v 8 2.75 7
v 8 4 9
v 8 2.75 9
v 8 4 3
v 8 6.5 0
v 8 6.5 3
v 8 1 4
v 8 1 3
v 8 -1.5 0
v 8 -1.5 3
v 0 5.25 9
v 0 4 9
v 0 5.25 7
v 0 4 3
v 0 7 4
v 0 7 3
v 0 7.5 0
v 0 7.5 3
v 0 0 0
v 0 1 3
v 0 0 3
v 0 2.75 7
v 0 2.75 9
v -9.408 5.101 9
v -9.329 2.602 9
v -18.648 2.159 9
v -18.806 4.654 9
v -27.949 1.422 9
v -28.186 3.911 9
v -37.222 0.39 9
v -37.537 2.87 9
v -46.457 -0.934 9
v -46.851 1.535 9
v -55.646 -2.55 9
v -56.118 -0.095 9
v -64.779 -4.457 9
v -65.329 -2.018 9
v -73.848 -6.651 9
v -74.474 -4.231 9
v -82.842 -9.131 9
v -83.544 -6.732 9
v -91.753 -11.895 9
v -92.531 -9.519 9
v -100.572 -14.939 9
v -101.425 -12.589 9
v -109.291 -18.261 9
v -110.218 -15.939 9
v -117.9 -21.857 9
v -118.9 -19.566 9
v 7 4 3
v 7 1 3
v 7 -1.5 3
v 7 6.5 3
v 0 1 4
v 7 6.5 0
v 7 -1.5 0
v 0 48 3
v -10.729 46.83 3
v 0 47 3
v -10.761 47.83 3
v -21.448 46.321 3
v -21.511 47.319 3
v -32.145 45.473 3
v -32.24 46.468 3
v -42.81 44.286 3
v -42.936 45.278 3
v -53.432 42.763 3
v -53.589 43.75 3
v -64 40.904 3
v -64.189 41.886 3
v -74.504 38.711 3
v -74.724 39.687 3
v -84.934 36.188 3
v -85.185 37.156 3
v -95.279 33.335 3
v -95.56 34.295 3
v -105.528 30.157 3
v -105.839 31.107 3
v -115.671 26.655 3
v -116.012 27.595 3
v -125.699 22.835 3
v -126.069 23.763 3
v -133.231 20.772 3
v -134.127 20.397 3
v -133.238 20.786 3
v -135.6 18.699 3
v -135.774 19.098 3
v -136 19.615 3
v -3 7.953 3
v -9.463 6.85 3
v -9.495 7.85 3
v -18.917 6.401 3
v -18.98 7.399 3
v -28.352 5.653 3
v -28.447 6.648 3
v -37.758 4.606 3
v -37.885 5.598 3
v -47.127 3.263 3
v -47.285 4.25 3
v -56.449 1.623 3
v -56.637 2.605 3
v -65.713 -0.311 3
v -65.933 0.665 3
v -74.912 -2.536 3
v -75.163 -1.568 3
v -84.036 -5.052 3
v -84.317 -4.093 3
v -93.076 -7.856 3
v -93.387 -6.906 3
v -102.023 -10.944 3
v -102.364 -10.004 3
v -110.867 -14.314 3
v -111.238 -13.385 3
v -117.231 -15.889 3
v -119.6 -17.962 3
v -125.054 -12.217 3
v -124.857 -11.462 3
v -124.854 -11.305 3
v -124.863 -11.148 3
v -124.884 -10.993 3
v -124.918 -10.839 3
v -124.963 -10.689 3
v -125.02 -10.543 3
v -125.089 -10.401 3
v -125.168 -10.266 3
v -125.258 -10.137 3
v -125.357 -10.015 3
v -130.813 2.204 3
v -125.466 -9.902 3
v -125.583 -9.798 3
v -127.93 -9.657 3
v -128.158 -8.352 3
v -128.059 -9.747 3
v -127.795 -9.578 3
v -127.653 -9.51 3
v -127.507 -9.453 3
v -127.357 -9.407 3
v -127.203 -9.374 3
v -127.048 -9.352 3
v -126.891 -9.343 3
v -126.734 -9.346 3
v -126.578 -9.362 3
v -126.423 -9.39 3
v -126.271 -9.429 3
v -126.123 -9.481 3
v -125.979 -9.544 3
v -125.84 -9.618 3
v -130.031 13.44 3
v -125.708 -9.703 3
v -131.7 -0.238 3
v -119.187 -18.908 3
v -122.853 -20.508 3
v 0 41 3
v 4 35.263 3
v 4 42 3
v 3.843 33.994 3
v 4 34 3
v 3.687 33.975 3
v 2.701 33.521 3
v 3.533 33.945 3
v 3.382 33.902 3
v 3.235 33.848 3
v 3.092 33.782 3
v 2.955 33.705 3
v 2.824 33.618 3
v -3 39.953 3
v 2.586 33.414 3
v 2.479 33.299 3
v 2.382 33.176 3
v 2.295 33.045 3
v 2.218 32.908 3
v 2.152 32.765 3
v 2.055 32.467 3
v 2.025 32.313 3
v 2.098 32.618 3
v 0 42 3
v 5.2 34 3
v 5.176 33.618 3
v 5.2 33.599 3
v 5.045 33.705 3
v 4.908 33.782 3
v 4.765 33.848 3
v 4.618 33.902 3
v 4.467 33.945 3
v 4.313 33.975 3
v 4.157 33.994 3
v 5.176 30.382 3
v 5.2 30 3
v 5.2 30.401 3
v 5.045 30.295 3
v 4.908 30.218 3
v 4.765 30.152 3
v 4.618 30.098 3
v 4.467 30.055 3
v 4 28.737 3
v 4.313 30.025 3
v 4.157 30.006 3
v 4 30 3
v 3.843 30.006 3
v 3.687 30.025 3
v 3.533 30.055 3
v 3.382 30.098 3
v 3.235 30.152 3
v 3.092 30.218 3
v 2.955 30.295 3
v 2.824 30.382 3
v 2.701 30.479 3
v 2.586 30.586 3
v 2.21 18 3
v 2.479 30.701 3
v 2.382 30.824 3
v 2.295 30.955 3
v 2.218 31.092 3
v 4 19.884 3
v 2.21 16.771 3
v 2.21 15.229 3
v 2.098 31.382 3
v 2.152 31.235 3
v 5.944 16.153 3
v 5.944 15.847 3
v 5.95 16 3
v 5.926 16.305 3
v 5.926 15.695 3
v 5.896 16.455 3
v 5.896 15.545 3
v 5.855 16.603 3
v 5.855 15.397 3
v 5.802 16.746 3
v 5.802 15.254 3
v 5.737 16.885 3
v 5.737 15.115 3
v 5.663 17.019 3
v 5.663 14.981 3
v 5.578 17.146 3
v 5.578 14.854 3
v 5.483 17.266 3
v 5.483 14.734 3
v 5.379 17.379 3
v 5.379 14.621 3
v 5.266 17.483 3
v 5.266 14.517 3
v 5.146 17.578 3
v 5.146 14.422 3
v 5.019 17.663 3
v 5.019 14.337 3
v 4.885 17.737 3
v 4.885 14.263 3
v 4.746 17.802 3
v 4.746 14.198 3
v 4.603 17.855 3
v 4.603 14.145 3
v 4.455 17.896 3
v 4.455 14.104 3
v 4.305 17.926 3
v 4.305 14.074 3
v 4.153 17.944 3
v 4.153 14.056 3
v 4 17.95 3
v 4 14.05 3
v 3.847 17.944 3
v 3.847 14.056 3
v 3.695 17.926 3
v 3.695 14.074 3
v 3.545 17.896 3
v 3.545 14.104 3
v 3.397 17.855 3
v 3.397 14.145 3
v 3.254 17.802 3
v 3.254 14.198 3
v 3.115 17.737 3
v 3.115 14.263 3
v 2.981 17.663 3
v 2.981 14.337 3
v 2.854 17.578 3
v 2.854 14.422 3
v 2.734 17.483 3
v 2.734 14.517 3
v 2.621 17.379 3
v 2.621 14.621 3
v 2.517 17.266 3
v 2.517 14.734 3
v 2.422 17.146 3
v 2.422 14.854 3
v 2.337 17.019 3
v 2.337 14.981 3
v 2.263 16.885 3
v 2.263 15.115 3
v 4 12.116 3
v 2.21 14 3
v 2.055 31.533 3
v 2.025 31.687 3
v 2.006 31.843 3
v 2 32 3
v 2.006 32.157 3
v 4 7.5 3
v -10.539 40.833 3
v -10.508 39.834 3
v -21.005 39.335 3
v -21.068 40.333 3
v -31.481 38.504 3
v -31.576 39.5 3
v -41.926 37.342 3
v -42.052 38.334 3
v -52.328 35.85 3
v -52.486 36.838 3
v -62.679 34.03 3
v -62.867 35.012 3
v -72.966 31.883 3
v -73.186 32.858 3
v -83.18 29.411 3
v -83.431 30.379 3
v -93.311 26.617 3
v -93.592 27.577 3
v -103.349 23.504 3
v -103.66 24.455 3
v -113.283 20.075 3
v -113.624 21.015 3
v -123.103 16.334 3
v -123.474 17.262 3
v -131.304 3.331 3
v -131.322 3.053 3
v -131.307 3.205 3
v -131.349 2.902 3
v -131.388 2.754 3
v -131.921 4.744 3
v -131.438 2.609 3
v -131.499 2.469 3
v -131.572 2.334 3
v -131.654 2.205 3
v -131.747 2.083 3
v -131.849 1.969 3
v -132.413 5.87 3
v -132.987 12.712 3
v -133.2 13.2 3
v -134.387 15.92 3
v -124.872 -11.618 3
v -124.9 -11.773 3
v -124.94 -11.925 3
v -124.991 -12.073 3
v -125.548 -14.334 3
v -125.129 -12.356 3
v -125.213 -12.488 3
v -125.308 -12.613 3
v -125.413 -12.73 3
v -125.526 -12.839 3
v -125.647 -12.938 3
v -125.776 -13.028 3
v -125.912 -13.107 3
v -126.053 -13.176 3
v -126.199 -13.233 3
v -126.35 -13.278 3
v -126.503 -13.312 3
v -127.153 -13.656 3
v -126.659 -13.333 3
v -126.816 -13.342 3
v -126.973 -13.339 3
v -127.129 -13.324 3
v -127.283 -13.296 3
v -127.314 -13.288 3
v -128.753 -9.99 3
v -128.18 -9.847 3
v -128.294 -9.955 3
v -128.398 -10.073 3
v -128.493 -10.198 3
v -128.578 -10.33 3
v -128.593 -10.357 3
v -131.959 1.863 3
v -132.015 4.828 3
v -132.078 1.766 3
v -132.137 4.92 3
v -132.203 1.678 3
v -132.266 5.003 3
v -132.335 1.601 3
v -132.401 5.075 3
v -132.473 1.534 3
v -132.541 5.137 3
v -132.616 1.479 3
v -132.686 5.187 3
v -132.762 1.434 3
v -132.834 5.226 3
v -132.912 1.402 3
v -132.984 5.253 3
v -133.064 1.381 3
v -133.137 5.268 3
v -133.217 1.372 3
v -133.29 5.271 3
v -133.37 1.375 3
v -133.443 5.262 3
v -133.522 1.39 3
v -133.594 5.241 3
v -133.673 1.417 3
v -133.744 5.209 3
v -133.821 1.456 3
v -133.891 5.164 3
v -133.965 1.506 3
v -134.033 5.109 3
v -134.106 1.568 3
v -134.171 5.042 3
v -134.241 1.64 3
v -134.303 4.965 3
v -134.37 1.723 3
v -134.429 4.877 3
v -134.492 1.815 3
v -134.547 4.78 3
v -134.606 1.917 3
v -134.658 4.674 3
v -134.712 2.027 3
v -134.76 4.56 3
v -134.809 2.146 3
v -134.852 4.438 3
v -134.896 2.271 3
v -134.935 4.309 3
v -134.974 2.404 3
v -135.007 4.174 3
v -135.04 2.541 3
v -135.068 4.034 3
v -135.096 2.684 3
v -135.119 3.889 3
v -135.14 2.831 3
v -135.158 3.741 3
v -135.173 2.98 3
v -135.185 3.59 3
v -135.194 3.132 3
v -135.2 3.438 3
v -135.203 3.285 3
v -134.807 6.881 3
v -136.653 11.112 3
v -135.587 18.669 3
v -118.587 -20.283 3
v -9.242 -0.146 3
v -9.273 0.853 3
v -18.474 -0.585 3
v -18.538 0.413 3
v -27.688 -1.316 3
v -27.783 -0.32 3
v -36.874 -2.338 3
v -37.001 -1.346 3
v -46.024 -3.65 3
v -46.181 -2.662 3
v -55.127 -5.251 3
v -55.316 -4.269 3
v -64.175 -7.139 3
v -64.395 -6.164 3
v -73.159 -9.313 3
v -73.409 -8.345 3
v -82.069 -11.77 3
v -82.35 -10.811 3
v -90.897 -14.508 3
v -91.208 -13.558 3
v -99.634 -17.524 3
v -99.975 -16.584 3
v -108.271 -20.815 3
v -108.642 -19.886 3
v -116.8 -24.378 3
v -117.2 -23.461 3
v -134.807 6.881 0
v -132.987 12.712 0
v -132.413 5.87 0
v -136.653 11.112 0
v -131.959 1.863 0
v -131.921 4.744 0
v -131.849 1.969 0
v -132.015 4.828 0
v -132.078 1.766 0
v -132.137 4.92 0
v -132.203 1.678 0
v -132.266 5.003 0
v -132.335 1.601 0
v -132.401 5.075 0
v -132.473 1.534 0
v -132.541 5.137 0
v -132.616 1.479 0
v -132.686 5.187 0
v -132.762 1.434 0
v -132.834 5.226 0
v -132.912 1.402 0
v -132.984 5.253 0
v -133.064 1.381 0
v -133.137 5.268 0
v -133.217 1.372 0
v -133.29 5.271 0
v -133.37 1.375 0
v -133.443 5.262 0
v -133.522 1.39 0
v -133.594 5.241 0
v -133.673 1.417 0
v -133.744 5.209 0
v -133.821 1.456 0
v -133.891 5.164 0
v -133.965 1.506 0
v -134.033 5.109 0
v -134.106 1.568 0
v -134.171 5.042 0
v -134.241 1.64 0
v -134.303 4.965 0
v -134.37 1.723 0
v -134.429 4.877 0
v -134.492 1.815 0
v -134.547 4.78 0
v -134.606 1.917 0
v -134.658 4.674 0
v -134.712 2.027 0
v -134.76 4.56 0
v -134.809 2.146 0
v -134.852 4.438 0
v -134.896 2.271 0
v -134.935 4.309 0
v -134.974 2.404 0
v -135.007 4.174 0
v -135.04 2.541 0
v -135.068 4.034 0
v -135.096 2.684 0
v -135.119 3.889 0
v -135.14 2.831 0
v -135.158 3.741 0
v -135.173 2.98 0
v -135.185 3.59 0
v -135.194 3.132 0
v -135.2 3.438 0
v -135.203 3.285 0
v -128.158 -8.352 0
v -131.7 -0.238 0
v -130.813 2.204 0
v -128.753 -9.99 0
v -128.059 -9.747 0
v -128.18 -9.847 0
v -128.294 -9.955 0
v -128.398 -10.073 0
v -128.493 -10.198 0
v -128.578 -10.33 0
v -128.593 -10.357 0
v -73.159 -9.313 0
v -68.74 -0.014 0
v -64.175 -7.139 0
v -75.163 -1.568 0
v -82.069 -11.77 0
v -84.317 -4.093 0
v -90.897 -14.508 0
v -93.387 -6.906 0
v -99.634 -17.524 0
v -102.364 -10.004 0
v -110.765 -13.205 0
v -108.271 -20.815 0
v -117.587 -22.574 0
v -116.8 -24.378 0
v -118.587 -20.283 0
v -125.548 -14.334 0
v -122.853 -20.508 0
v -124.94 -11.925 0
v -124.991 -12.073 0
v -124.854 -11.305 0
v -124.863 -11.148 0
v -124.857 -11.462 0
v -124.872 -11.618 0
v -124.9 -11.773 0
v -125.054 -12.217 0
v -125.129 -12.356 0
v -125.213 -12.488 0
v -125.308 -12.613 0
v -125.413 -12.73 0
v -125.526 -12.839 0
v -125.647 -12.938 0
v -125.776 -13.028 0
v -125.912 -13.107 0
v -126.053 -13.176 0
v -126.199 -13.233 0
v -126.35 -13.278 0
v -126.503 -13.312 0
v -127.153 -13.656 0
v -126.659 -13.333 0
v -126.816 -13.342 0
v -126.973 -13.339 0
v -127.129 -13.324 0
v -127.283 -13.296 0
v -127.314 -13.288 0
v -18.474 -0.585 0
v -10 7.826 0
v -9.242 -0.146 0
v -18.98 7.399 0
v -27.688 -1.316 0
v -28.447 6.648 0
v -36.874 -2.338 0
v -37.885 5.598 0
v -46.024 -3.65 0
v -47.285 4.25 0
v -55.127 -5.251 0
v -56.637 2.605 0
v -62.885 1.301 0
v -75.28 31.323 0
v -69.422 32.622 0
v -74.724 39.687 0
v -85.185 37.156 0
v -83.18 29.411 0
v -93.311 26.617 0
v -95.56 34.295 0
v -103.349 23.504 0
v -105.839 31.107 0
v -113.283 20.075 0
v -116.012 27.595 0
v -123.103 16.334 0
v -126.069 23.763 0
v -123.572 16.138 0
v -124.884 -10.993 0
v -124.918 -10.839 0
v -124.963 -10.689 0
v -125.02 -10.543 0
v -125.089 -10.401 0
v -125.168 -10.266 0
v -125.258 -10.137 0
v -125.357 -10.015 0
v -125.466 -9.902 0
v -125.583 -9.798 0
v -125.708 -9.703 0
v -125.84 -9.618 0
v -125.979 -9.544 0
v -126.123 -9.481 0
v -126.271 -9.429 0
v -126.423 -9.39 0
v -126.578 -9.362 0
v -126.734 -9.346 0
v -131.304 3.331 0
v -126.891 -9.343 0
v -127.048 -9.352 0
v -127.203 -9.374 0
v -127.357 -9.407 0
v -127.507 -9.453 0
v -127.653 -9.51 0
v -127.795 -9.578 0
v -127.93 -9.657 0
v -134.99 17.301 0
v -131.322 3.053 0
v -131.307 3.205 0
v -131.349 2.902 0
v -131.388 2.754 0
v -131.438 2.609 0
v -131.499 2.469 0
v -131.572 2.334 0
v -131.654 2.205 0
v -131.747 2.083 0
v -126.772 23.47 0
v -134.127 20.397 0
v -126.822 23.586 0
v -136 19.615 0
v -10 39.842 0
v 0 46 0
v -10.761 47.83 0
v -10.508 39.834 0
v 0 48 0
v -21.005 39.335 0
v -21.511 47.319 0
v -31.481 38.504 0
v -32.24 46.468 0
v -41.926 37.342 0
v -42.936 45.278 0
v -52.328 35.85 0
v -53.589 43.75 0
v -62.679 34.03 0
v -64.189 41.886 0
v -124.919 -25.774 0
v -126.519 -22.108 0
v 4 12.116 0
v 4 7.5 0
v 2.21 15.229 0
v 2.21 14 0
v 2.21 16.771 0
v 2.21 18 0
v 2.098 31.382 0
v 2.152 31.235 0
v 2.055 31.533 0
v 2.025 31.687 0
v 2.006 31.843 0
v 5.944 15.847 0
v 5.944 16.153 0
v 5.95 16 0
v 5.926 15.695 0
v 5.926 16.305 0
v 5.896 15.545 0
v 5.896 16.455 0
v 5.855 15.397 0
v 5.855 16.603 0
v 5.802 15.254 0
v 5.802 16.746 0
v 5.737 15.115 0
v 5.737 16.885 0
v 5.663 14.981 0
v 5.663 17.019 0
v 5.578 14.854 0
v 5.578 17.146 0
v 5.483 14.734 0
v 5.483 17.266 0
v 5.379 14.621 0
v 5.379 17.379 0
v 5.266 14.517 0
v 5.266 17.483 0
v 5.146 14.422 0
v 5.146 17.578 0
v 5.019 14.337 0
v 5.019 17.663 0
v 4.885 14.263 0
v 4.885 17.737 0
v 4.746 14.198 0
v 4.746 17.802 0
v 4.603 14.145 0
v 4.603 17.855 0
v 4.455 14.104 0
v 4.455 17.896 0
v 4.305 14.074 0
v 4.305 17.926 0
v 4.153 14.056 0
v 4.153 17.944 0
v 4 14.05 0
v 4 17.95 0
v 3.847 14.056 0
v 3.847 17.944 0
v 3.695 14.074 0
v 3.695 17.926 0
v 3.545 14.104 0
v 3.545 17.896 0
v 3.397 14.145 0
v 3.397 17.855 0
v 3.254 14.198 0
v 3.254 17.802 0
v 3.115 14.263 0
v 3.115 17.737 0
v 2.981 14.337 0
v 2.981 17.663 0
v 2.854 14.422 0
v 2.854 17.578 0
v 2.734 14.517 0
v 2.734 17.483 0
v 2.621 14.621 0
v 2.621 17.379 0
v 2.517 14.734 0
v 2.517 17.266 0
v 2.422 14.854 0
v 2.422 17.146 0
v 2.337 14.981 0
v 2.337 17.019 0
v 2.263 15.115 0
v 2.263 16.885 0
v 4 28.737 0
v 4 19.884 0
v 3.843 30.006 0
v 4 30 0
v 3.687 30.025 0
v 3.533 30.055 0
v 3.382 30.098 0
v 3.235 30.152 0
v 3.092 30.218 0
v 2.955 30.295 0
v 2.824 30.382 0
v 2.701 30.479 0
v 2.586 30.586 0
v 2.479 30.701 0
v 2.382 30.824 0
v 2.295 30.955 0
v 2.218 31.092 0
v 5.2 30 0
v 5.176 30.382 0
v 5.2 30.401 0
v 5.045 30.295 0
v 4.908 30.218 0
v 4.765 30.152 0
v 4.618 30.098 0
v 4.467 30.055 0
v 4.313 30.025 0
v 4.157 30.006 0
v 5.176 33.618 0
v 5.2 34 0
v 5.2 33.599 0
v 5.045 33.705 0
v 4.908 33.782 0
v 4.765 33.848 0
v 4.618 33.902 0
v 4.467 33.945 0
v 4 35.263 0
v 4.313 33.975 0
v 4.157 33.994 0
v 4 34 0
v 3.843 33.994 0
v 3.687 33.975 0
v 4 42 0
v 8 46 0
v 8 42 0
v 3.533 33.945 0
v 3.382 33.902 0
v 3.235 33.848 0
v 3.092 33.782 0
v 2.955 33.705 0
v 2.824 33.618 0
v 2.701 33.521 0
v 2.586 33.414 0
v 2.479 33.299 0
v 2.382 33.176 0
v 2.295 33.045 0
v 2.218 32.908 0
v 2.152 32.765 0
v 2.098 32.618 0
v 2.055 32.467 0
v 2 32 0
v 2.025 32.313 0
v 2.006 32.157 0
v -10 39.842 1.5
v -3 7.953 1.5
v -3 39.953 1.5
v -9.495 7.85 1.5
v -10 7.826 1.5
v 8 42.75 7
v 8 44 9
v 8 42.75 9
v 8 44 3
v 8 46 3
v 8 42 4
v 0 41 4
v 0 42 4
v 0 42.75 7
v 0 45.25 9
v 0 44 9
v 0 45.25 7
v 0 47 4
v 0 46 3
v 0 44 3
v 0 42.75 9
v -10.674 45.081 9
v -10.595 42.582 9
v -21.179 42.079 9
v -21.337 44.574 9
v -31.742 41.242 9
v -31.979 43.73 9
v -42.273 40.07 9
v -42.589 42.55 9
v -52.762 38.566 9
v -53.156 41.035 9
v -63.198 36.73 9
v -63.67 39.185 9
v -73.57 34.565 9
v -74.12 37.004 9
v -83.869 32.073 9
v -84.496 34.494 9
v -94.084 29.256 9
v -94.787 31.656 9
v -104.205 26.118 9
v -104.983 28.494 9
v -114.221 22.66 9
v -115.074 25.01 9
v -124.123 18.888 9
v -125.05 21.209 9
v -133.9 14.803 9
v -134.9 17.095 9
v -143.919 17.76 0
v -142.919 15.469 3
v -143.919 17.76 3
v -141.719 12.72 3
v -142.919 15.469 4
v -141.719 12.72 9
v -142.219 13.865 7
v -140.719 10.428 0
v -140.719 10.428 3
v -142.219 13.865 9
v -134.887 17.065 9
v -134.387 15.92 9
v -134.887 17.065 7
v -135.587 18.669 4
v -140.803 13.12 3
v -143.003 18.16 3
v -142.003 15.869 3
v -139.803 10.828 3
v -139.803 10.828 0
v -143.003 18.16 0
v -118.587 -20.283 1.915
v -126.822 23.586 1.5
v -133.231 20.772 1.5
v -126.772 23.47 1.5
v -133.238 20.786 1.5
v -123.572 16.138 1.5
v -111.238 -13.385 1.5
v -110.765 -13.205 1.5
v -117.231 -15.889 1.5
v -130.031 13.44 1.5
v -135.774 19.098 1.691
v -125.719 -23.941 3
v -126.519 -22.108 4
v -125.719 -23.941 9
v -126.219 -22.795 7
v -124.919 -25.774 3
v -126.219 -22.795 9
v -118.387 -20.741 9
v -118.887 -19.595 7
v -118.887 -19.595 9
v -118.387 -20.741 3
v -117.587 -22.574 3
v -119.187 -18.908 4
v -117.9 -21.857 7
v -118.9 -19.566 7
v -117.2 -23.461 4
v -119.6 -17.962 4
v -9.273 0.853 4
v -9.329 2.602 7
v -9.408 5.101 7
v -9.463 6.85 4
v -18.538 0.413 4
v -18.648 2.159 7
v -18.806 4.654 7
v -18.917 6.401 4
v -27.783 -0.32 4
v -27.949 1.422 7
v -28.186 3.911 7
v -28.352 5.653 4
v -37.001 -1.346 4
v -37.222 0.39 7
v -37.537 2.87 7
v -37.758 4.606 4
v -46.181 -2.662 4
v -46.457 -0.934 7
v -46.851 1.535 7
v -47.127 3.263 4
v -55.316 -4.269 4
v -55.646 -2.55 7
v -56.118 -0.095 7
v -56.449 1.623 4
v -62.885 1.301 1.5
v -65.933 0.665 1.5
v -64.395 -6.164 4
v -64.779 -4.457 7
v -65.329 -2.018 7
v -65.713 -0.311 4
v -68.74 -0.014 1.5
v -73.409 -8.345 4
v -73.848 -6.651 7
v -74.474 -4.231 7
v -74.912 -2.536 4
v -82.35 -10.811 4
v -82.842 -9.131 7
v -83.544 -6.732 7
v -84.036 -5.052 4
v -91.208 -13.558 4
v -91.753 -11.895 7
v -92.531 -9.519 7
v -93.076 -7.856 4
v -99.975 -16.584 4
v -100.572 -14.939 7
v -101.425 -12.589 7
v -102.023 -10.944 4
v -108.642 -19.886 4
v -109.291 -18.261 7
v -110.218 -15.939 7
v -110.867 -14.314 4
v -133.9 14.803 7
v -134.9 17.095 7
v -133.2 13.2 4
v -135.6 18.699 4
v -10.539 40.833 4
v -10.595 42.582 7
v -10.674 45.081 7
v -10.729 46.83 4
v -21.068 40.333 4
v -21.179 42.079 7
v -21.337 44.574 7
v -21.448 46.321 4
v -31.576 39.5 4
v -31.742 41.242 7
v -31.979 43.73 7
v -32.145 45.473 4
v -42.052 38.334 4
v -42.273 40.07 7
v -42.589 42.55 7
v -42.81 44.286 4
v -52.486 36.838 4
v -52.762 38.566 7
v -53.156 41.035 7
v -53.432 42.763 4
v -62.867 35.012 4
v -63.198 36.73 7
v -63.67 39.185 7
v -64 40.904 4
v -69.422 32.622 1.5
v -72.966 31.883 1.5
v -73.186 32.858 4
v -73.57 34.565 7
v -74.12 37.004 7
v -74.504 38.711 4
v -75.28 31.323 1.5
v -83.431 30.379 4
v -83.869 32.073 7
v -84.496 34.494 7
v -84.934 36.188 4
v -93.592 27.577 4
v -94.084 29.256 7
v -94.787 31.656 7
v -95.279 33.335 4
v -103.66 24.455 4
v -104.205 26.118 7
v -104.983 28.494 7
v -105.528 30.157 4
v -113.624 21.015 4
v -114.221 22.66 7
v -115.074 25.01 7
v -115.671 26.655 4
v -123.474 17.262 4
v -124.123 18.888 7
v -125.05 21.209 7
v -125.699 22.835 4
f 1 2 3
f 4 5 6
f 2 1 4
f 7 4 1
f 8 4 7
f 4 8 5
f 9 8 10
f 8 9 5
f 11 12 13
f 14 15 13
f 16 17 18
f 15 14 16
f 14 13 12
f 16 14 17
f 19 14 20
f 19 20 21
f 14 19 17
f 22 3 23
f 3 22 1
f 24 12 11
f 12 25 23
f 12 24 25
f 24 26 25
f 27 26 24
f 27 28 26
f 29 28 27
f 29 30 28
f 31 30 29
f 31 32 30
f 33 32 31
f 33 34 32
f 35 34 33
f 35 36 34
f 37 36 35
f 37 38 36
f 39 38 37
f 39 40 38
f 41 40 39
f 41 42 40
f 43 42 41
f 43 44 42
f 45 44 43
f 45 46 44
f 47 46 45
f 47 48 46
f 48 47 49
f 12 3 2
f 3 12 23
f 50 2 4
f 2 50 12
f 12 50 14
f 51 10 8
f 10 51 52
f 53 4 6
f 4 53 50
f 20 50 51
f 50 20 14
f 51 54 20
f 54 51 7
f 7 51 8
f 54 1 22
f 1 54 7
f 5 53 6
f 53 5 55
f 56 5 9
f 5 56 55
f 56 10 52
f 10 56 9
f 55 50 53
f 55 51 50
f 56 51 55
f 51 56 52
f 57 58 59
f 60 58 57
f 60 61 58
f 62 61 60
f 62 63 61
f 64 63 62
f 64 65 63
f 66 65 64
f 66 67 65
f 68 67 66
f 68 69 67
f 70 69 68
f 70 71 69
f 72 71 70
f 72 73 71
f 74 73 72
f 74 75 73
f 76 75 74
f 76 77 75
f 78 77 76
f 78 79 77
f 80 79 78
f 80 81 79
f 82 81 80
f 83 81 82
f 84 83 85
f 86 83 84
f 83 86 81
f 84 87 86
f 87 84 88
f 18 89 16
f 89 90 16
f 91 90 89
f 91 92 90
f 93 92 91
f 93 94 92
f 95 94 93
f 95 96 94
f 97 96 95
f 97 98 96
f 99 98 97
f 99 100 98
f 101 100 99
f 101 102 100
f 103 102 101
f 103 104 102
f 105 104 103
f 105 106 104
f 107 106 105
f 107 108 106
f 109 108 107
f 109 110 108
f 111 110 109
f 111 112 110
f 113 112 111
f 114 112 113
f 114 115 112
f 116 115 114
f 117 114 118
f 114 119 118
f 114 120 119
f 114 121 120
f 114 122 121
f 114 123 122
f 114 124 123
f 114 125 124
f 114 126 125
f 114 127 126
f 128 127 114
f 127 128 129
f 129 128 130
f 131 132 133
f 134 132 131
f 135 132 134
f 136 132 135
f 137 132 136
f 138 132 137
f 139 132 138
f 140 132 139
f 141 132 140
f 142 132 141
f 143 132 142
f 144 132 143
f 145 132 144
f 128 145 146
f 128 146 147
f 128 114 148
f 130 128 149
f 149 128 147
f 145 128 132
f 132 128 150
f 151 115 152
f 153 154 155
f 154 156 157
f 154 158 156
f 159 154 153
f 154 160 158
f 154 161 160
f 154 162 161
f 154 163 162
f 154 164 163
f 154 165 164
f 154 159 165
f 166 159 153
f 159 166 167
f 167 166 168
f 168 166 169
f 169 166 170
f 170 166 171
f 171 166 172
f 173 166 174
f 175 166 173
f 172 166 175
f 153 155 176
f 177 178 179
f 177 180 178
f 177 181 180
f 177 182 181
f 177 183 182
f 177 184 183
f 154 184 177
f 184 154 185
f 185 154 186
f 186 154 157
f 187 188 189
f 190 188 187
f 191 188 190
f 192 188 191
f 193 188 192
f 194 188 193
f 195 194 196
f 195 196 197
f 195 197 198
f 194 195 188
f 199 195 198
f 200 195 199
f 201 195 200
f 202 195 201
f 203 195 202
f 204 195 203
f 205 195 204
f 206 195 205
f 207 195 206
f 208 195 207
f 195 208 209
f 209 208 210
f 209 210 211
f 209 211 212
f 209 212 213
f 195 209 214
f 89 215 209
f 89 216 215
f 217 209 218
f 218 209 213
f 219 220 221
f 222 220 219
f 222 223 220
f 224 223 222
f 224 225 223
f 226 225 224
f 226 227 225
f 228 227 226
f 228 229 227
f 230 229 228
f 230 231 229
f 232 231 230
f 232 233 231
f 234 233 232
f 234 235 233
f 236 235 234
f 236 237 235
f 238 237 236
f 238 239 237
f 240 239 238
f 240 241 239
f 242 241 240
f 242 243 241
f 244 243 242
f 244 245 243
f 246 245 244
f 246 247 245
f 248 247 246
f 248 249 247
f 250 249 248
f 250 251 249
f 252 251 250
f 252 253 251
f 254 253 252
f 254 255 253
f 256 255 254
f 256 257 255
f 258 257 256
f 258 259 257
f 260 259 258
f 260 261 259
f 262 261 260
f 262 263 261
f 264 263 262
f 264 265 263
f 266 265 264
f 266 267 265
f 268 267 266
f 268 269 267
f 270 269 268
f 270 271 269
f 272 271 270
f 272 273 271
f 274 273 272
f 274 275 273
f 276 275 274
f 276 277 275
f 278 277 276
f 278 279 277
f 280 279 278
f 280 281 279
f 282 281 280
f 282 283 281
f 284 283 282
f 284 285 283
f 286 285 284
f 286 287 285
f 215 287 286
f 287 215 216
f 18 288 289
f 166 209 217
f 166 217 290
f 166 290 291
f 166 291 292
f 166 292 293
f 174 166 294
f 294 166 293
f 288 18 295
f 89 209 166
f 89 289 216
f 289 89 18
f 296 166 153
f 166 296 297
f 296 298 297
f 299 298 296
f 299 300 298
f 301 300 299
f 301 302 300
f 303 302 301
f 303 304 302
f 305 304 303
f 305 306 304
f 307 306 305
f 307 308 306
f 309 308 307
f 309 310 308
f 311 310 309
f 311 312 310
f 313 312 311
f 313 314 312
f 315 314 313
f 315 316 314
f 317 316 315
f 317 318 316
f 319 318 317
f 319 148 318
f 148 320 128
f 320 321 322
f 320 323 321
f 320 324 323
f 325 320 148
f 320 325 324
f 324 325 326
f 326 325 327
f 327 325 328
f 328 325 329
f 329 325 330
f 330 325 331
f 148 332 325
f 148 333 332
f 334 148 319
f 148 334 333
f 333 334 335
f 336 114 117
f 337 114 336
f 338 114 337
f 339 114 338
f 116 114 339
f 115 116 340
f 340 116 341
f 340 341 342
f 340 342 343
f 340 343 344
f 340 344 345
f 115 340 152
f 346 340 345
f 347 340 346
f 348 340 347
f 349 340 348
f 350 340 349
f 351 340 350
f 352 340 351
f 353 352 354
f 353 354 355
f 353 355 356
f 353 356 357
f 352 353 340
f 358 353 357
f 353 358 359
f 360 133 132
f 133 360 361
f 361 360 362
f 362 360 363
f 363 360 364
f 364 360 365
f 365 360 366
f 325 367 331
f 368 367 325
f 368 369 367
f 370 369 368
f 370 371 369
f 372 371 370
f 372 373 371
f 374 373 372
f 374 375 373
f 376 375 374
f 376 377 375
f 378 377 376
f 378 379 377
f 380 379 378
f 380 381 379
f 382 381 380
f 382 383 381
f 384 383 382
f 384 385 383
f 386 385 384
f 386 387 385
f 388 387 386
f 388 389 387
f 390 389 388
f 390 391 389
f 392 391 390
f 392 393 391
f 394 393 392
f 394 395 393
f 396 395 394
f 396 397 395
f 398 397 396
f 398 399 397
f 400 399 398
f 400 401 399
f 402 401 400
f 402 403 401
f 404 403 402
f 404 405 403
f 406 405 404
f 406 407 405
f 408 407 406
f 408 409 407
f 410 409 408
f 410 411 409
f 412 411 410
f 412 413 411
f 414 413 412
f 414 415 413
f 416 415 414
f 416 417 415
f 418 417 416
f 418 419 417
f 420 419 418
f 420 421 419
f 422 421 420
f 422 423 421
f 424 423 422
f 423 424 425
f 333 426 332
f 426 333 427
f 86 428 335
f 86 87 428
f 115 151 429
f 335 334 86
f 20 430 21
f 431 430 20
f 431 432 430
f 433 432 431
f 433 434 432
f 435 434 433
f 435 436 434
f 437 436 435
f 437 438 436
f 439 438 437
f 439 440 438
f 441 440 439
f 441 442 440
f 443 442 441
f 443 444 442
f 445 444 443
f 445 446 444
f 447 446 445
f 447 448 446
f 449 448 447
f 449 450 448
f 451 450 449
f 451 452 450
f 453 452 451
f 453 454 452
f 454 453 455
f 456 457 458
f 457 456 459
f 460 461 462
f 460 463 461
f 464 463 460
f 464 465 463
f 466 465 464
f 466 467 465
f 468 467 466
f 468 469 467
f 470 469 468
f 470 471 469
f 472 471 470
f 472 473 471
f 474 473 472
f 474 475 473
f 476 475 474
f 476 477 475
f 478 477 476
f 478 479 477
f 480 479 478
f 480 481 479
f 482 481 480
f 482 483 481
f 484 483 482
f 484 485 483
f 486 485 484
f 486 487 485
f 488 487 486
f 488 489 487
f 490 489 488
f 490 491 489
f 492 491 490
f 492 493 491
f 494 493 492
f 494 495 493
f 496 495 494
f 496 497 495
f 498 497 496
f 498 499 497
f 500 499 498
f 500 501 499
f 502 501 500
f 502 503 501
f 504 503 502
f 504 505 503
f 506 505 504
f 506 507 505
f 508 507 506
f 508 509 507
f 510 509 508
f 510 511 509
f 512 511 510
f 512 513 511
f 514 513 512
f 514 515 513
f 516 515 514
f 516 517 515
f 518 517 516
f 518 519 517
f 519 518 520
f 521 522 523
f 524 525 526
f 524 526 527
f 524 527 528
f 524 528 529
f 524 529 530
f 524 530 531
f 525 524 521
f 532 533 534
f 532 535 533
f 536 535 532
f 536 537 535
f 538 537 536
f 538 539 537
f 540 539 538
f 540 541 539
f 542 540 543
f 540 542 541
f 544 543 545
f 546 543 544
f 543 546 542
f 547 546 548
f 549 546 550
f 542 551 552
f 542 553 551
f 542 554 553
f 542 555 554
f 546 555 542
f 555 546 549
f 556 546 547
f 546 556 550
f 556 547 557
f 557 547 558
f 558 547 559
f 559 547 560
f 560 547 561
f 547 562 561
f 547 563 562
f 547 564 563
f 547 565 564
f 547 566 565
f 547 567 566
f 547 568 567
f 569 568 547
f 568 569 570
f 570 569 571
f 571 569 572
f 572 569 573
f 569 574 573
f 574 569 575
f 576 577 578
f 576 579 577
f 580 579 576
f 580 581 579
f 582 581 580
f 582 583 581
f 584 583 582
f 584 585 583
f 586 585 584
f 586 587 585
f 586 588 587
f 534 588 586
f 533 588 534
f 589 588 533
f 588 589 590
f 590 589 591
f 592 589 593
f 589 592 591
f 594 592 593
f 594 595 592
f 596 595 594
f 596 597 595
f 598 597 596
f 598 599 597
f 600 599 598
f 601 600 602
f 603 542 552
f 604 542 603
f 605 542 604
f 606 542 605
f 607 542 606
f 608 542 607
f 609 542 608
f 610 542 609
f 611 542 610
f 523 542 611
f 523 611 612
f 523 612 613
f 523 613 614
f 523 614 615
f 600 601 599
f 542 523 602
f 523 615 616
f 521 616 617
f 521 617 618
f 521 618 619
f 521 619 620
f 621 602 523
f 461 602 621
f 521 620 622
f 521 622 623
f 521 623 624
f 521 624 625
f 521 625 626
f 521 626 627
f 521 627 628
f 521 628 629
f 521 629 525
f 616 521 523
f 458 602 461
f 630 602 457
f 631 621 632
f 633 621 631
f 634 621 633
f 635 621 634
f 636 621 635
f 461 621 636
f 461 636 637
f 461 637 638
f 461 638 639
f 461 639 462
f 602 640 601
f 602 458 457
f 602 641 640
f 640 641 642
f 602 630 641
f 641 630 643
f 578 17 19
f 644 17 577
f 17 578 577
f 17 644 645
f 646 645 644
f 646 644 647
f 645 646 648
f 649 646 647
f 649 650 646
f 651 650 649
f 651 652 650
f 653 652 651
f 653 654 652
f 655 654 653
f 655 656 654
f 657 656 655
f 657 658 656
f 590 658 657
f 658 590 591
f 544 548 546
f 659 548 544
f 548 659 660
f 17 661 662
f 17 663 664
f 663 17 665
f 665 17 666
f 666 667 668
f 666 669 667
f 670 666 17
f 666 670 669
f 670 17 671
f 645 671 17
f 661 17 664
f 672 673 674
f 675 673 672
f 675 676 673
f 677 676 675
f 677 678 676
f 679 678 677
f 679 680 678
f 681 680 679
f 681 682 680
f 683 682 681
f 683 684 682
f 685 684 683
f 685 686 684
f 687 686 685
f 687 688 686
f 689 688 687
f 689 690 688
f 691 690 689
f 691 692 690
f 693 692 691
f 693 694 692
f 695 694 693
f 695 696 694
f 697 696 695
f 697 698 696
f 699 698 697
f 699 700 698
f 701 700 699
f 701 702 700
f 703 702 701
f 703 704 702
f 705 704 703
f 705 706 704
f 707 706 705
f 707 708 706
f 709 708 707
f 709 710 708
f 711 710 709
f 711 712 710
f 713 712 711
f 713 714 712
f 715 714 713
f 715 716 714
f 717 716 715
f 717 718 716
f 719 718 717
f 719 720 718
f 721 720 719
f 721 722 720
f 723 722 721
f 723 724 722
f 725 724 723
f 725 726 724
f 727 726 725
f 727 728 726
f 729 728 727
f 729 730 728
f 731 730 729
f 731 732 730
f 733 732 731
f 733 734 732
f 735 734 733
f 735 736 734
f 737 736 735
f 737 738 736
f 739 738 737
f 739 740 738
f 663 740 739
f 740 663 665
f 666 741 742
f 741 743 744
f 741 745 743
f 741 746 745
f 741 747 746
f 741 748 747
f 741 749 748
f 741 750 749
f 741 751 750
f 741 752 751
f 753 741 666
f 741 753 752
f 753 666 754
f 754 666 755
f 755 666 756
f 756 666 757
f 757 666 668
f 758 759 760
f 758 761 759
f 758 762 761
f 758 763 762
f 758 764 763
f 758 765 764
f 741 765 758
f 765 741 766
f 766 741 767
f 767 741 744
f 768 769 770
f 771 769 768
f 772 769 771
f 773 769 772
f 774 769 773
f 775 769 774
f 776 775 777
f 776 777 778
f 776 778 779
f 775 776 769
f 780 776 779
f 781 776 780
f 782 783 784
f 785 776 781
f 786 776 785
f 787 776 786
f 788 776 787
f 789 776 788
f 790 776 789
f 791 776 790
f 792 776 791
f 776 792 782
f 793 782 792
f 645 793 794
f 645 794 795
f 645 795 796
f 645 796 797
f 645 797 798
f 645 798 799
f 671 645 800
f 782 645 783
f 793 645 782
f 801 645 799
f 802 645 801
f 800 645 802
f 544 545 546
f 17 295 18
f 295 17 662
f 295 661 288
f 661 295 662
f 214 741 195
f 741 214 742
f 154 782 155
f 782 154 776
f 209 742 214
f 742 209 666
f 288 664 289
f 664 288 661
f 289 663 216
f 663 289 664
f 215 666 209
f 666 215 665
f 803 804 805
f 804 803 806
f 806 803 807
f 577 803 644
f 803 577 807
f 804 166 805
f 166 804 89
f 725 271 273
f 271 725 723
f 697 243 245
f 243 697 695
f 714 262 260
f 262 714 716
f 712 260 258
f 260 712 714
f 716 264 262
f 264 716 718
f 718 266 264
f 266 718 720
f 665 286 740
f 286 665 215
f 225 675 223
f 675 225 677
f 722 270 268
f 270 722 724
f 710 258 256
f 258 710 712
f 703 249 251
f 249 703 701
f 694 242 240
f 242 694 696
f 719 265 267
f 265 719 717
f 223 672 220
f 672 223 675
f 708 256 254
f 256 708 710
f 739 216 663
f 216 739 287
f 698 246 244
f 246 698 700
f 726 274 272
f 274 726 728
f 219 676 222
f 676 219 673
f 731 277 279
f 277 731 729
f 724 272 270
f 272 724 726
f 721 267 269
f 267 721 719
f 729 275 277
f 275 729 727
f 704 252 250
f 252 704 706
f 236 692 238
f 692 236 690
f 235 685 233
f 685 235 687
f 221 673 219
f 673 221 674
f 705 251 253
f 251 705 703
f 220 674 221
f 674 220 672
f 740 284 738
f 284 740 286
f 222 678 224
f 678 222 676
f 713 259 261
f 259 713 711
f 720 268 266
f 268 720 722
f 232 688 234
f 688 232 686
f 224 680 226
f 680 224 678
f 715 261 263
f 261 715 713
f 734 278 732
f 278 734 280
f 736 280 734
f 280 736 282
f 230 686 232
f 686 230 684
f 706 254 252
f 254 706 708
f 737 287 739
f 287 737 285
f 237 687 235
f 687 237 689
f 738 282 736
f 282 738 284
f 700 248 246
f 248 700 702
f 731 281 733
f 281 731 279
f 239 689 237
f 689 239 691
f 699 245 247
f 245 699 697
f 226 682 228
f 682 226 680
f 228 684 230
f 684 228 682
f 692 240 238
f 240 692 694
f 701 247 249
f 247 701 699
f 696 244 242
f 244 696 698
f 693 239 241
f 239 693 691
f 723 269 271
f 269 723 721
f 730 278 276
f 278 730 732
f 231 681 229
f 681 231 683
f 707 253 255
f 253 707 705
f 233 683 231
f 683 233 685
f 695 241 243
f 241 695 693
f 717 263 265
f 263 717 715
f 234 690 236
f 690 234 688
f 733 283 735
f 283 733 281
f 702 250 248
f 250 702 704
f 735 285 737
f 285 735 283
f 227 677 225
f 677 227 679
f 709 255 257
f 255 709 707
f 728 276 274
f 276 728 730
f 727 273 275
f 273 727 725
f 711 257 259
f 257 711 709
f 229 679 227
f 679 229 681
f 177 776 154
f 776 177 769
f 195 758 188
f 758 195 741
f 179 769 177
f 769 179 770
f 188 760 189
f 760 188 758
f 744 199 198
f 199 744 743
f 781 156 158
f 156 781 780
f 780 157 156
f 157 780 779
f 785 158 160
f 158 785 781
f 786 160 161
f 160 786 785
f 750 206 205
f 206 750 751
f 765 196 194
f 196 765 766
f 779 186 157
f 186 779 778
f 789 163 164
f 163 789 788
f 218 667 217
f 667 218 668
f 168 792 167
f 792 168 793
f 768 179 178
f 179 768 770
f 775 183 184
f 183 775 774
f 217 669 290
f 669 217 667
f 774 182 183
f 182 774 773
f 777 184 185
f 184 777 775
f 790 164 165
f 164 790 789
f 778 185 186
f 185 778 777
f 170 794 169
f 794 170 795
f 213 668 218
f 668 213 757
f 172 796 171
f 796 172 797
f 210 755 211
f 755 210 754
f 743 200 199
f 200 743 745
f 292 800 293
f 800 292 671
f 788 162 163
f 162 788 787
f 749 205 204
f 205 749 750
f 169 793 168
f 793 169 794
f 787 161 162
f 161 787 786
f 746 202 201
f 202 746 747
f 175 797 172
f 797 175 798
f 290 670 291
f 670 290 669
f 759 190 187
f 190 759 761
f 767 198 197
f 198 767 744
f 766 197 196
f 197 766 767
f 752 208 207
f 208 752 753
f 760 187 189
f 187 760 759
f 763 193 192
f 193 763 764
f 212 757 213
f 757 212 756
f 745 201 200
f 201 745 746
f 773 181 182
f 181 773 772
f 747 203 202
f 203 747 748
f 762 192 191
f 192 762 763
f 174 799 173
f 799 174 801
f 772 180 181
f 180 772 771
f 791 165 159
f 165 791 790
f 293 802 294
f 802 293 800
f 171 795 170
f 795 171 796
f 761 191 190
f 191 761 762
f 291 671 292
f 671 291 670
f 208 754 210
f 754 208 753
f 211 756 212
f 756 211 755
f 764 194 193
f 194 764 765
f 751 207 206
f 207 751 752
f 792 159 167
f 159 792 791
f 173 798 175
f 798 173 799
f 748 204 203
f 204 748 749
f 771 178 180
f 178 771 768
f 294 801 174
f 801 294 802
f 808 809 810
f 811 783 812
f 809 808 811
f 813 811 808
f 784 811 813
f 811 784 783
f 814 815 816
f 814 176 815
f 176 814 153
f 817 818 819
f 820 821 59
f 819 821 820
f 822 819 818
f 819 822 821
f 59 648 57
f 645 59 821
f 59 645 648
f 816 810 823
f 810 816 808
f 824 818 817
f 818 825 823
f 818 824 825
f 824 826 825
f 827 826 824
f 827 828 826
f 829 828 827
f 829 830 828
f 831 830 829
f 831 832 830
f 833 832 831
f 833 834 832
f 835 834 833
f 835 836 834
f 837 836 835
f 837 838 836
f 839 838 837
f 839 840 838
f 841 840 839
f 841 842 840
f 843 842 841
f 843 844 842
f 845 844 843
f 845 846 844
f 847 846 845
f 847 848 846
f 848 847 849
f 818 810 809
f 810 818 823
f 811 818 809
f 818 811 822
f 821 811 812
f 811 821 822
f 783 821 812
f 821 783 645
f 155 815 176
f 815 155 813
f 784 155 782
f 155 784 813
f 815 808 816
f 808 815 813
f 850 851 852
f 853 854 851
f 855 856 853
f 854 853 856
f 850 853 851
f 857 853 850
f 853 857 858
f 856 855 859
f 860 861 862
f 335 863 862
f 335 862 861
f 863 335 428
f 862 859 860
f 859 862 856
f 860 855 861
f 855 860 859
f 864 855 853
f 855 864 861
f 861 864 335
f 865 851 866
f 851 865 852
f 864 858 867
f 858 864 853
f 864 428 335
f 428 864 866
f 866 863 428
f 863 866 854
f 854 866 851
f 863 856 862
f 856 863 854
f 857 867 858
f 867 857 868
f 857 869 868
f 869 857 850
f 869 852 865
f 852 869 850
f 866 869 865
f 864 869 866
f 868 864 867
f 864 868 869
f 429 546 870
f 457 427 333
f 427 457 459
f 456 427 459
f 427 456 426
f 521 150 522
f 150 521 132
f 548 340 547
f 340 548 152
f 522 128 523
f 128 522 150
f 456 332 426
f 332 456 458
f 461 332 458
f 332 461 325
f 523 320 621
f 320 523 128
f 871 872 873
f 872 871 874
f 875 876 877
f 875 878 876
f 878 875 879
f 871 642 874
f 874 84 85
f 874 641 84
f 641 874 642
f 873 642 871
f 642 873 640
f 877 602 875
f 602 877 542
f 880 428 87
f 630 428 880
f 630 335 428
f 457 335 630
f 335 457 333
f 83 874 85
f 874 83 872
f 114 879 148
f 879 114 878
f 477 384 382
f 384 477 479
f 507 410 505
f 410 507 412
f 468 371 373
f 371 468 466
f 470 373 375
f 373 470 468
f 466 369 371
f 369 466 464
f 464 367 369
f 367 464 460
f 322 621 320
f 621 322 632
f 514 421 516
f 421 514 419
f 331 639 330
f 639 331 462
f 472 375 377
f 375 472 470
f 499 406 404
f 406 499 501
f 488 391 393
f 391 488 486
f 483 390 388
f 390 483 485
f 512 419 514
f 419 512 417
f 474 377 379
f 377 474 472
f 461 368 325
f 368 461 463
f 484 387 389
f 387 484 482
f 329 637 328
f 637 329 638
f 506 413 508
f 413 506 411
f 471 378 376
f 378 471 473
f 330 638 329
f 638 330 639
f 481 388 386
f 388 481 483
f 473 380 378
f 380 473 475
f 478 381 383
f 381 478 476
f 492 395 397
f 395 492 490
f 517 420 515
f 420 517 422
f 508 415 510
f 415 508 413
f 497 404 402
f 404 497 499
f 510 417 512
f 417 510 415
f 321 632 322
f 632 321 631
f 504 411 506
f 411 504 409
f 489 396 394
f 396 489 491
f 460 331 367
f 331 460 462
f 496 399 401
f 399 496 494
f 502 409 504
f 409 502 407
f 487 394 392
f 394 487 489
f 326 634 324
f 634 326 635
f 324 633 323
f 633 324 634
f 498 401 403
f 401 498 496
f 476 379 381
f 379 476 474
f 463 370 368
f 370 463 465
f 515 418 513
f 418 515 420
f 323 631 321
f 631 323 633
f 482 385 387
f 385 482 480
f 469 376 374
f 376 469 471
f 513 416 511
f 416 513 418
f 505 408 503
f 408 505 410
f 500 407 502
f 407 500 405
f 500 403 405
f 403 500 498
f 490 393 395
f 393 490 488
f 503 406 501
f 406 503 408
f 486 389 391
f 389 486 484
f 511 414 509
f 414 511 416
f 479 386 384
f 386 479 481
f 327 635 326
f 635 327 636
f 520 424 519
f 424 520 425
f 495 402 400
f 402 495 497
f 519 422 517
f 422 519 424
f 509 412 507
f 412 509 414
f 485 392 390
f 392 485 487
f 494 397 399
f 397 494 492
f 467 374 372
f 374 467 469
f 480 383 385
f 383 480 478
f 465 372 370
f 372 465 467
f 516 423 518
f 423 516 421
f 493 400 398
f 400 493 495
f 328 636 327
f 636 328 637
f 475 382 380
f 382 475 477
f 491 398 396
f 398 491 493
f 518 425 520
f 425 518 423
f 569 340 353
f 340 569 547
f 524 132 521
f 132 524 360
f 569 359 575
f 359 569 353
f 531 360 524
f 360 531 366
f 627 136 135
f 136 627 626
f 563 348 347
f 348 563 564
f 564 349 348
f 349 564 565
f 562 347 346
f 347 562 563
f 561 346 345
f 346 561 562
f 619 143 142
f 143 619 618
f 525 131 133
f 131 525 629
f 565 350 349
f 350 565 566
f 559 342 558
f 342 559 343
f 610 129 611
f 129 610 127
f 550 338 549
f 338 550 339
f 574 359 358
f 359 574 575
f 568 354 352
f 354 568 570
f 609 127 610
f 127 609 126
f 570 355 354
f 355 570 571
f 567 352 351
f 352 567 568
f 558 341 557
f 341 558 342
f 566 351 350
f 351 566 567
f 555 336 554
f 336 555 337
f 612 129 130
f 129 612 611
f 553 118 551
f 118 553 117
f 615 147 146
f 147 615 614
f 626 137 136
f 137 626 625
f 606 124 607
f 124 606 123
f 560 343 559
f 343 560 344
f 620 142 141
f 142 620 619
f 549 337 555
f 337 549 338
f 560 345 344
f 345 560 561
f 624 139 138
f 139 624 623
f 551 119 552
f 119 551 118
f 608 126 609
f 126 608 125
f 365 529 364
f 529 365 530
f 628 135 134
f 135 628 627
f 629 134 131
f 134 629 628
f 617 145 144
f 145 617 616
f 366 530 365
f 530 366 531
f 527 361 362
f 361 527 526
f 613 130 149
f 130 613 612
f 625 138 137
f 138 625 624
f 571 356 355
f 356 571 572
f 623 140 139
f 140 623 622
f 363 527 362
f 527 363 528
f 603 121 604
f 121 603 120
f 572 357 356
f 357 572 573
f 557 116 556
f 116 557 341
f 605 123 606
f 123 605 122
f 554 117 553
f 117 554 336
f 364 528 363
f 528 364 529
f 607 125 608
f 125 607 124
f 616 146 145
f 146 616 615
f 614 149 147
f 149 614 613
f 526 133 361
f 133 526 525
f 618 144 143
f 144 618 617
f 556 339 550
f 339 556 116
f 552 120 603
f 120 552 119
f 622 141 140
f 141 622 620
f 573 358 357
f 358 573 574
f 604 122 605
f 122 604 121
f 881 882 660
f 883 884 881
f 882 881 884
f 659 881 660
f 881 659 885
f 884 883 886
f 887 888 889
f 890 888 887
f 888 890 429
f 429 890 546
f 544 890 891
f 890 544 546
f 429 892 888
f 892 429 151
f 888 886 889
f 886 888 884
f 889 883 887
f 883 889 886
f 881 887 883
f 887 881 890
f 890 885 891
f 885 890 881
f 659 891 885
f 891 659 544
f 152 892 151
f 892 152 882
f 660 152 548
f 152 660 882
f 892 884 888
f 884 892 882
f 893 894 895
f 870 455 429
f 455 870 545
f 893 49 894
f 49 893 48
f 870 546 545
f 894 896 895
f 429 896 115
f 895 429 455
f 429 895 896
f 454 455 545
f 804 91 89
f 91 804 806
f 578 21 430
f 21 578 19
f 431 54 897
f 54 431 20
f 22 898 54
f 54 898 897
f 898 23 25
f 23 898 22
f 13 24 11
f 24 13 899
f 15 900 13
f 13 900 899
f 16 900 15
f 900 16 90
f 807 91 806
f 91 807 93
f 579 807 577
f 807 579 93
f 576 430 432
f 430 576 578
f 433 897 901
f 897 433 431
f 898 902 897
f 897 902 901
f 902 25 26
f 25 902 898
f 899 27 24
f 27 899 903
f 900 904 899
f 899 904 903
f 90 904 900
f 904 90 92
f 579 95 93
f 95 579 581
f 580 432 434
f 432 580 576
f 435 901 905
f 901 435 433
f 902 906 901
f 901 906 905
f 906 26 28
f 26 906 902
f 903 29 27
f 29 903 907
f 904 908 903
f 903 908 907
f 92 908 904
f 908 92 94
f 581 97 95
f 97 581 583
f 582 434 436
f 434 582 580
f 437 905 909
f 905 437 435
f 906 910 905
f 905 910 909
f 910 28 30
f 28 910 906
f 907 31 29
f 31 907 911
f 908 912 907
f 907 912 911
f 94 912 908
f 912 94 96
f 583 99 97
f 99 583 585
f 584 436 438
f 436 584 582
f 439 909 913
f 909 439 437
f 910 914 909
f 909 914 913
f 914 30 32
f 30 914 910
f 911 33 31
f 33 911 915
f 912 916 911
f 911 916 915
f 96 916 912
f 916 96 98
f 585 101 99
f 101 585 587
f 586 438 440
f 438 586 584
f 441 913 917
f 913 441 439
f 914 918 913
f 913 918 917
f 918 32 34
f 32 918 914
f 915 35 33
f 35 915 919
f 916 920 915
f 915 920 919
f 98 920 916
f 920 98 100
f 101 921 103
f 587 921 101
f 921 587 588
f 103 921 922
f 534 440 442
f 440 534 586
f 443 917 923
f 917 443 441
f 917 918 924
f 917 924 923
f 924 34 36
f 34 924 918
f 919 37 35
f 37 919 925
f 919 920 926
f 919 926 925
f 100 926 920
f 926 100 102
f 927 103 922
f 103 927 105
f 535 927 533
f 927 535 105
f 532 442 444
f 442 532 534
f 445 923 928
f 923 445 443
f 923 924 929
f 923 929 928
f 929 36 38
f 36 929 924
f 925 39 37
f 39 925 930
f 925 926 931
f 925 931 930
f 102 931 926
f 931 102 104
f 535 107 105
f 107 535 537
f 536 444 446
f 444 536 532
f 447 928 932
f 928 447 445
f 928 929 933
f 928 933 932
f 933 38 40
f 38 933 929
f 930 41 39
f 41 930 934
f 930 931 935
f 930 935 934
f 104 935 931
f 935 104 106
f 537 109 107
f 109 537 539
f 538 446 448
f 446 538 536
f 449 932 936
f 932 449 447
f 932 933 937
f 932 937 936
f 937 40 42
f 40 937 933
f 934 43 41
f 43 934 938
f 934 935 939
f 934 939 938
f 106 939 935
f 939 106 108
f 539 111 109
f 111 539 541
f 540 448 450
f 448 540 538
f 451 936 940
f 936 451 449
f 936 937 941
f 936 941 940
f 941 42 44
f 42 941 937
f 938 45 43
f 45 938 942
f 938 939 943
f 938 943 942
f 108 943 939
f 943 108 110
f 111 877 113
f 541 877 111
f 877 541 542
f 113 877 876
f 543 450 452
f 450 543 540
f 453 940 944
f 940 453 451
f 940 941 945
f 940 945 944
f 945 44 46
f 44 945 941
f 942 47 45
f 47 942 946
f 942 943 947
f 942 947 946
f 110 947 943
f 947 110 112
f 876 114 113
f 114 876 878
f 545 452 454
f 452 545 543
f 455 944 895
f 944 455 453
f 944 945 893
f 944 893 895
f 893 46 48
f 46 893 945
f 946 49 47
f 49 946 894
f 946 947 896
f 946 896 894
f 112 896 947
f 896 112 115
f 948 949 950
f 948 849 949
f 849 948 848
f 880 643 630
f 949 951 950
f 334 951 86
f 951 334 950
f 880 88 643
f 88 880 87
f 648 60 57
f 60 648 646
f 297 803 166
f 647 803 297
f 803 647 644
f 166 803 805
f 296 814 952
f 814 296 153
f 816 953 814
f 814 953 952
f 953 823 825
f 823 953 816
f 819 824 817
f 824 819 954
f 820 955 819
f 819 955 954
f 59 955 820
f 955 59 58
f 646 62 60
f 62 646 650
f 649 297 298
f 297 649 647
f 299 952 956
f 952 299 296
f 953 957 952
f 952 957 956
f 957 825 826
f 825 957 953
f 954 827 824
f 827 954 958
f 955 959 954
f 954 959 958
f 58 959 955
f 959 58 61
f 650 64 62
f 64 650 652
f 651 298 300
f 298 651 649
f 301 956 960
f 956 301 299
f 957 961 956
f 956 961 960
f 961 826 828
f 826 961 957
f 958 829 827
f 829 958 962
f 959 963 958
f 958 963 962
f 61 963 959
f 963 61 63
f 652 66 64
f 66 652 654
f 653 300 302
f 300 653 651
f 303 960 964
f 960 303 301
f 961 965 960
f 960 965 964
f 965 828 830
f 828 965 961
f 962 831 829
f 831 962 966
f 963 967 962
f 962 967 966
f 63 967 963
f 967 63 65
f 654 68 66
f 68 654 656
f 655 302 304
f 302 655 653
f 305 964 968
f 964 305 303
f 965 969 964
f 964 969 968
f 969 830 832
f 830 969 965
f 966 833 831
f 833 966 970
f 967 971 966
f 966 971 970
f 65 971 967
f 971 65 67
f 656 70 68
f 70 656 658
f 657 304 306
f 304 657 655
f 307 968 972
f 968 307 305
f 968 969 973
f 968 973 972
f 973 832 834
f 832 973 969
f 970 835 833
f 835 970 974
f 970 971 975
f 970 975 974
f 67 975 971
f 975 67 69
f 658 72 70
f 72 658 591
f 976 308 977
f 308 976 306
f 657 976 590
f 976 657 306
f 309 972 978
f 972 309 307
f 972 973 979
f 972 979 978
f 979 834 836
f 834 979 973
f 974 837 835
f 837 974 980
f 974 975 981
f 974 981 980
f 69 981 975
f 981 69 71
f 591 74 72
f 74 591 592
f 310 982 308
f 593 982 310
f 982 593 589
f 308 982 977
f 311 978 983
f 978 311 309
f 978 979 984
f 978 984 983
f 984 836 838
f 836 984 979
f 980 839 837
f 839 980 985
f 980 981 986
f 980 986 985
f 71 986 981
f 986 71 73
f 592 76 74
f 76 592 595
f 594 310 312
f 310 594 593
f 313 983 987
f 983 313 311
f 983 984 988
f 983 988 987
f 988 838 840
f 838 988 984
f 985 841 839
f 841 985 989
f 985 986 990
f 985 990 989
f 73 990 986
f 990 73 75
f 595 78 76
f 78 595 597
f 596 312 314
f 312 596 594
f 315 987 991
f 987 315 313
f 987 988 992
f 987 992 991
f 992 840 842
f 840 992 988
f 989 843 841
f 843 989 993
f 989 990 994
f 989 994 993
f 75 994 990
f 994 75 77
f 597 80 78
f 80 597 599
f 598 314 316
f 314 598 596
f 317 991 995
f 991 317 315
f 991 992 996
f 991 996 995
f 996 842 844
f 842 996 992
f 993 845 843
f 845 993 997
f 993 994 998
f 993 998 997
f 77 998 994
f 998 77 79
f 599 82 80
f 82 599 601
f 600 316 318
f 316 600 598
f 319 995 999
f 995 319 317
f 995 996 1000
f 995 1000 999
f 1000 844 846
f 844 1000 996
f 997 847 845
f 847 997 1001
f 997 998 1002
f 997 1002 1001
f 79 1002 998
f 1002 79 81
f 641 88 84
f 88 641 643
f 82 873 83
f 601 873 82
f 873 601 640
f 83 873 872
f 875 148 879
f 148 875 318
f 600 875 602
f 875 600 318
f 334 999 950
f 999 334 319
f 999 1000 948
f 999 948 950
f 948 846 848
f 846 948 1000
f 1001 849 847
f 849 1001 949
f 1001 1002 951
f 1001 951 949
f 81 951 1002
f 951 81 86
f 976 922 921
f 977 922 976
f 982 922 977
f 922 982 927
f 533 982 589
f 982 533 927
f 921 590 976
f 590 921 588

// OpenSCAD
length = 120;
diameter = 300;

module rail_main(length) {
    poly = [[0,0],[0,8],[3,8],[3,7],[4,7],[7,5.25],[9,5.25],[9,2.75],[7,2.75],[4,1],[3,1],[3,0]];
    rotate([90,-90,180]) linear_extrude(length) polygon(poly);
}

module rail_curved(angle, diameter) {
    poly = [[0,0],[0,8],[3,8],[3,7],[4,7],[7,5.25],[9,5.25],[9,2.75],[7,2.75],[4,1],[3,1],[3,0]];
    translate([-diameter+8,0,0])
    rotate_extrude(angle = angle, $fn = 200)
    translate([diameter,0,0])
    rotate([0,0,90]) 
    polygon(poly);
}

module rail_endpoint_right() {
    poly = [[0,2],[0,6],[3,6],[3,4],[9,4],[9,2.75],[7,2.75],[4,2],[3,2]];
    rotate([90,-90,180]) linear_extrude(8) polygon(poly);
}

module rail_endpoint_left() {
    poly = [[3,8],[3,4],[9,4],[9,2.75],[7,2.75],[4,1],[3,1]];
    rotate([90,-90,180]) linear_extrude(8) polygon(poly);
    // support
    translate([-1.5,0,0]) cube([8,1,3], false);
}

module attach_poly(h) {
    linear_extrude(h) polygon([[0,0],[2,1.9],[6,1.9],[8,0]]);
}

module attach(l) {
    difference() {
        union() {
            cube([41,l,1.5], false);
            cube([41,3,3], false);
            difference() {
                translate ([7.5,-4,0]) cube([36,6,3], false);
                translate ([12,-4.11,-0.5]) attach_poly(4);
            }
            translate ([16,-4,0]) cylinder(3,1.95,1.95,false, $fn = 80);
            translate ([28,-3.3,0]) mirror([0,1,0]) attach_poly(3);
        }
        translate ([32,-4,-0.5]) cylinder(4,2,2,false, $fn = 80);
    }
}

module full_endpoint() {
    translate([0,-8,0]) rail_endpoint_left();
    translate([40,-8,0]) rail_endpoint_right();
    attach(10);
}

module barreau() {
    translate([8,0,0]) cube([36,6,1.5], false);
}

module main() {

    angle = asin(length/diameter);
    rail_curved(angle, diameter);
    translate([40,0,0]) rail_curved(angle, diameter+40);
    
    full_endpoint();

    translate([-diameter,0,0]) 
    rotate([0,0,angle]) 
    translate([diameter+47.3,-3.2,0]) rotate([180,180,0]) full_endpoint();

    translate([-diameter,0,0]) 
    rotate([0,0,angle/2]) 
    translate([diameter-2,0,0]) barreau();
}

rotate([0,0,90]) main();


//rail_curved(length);
